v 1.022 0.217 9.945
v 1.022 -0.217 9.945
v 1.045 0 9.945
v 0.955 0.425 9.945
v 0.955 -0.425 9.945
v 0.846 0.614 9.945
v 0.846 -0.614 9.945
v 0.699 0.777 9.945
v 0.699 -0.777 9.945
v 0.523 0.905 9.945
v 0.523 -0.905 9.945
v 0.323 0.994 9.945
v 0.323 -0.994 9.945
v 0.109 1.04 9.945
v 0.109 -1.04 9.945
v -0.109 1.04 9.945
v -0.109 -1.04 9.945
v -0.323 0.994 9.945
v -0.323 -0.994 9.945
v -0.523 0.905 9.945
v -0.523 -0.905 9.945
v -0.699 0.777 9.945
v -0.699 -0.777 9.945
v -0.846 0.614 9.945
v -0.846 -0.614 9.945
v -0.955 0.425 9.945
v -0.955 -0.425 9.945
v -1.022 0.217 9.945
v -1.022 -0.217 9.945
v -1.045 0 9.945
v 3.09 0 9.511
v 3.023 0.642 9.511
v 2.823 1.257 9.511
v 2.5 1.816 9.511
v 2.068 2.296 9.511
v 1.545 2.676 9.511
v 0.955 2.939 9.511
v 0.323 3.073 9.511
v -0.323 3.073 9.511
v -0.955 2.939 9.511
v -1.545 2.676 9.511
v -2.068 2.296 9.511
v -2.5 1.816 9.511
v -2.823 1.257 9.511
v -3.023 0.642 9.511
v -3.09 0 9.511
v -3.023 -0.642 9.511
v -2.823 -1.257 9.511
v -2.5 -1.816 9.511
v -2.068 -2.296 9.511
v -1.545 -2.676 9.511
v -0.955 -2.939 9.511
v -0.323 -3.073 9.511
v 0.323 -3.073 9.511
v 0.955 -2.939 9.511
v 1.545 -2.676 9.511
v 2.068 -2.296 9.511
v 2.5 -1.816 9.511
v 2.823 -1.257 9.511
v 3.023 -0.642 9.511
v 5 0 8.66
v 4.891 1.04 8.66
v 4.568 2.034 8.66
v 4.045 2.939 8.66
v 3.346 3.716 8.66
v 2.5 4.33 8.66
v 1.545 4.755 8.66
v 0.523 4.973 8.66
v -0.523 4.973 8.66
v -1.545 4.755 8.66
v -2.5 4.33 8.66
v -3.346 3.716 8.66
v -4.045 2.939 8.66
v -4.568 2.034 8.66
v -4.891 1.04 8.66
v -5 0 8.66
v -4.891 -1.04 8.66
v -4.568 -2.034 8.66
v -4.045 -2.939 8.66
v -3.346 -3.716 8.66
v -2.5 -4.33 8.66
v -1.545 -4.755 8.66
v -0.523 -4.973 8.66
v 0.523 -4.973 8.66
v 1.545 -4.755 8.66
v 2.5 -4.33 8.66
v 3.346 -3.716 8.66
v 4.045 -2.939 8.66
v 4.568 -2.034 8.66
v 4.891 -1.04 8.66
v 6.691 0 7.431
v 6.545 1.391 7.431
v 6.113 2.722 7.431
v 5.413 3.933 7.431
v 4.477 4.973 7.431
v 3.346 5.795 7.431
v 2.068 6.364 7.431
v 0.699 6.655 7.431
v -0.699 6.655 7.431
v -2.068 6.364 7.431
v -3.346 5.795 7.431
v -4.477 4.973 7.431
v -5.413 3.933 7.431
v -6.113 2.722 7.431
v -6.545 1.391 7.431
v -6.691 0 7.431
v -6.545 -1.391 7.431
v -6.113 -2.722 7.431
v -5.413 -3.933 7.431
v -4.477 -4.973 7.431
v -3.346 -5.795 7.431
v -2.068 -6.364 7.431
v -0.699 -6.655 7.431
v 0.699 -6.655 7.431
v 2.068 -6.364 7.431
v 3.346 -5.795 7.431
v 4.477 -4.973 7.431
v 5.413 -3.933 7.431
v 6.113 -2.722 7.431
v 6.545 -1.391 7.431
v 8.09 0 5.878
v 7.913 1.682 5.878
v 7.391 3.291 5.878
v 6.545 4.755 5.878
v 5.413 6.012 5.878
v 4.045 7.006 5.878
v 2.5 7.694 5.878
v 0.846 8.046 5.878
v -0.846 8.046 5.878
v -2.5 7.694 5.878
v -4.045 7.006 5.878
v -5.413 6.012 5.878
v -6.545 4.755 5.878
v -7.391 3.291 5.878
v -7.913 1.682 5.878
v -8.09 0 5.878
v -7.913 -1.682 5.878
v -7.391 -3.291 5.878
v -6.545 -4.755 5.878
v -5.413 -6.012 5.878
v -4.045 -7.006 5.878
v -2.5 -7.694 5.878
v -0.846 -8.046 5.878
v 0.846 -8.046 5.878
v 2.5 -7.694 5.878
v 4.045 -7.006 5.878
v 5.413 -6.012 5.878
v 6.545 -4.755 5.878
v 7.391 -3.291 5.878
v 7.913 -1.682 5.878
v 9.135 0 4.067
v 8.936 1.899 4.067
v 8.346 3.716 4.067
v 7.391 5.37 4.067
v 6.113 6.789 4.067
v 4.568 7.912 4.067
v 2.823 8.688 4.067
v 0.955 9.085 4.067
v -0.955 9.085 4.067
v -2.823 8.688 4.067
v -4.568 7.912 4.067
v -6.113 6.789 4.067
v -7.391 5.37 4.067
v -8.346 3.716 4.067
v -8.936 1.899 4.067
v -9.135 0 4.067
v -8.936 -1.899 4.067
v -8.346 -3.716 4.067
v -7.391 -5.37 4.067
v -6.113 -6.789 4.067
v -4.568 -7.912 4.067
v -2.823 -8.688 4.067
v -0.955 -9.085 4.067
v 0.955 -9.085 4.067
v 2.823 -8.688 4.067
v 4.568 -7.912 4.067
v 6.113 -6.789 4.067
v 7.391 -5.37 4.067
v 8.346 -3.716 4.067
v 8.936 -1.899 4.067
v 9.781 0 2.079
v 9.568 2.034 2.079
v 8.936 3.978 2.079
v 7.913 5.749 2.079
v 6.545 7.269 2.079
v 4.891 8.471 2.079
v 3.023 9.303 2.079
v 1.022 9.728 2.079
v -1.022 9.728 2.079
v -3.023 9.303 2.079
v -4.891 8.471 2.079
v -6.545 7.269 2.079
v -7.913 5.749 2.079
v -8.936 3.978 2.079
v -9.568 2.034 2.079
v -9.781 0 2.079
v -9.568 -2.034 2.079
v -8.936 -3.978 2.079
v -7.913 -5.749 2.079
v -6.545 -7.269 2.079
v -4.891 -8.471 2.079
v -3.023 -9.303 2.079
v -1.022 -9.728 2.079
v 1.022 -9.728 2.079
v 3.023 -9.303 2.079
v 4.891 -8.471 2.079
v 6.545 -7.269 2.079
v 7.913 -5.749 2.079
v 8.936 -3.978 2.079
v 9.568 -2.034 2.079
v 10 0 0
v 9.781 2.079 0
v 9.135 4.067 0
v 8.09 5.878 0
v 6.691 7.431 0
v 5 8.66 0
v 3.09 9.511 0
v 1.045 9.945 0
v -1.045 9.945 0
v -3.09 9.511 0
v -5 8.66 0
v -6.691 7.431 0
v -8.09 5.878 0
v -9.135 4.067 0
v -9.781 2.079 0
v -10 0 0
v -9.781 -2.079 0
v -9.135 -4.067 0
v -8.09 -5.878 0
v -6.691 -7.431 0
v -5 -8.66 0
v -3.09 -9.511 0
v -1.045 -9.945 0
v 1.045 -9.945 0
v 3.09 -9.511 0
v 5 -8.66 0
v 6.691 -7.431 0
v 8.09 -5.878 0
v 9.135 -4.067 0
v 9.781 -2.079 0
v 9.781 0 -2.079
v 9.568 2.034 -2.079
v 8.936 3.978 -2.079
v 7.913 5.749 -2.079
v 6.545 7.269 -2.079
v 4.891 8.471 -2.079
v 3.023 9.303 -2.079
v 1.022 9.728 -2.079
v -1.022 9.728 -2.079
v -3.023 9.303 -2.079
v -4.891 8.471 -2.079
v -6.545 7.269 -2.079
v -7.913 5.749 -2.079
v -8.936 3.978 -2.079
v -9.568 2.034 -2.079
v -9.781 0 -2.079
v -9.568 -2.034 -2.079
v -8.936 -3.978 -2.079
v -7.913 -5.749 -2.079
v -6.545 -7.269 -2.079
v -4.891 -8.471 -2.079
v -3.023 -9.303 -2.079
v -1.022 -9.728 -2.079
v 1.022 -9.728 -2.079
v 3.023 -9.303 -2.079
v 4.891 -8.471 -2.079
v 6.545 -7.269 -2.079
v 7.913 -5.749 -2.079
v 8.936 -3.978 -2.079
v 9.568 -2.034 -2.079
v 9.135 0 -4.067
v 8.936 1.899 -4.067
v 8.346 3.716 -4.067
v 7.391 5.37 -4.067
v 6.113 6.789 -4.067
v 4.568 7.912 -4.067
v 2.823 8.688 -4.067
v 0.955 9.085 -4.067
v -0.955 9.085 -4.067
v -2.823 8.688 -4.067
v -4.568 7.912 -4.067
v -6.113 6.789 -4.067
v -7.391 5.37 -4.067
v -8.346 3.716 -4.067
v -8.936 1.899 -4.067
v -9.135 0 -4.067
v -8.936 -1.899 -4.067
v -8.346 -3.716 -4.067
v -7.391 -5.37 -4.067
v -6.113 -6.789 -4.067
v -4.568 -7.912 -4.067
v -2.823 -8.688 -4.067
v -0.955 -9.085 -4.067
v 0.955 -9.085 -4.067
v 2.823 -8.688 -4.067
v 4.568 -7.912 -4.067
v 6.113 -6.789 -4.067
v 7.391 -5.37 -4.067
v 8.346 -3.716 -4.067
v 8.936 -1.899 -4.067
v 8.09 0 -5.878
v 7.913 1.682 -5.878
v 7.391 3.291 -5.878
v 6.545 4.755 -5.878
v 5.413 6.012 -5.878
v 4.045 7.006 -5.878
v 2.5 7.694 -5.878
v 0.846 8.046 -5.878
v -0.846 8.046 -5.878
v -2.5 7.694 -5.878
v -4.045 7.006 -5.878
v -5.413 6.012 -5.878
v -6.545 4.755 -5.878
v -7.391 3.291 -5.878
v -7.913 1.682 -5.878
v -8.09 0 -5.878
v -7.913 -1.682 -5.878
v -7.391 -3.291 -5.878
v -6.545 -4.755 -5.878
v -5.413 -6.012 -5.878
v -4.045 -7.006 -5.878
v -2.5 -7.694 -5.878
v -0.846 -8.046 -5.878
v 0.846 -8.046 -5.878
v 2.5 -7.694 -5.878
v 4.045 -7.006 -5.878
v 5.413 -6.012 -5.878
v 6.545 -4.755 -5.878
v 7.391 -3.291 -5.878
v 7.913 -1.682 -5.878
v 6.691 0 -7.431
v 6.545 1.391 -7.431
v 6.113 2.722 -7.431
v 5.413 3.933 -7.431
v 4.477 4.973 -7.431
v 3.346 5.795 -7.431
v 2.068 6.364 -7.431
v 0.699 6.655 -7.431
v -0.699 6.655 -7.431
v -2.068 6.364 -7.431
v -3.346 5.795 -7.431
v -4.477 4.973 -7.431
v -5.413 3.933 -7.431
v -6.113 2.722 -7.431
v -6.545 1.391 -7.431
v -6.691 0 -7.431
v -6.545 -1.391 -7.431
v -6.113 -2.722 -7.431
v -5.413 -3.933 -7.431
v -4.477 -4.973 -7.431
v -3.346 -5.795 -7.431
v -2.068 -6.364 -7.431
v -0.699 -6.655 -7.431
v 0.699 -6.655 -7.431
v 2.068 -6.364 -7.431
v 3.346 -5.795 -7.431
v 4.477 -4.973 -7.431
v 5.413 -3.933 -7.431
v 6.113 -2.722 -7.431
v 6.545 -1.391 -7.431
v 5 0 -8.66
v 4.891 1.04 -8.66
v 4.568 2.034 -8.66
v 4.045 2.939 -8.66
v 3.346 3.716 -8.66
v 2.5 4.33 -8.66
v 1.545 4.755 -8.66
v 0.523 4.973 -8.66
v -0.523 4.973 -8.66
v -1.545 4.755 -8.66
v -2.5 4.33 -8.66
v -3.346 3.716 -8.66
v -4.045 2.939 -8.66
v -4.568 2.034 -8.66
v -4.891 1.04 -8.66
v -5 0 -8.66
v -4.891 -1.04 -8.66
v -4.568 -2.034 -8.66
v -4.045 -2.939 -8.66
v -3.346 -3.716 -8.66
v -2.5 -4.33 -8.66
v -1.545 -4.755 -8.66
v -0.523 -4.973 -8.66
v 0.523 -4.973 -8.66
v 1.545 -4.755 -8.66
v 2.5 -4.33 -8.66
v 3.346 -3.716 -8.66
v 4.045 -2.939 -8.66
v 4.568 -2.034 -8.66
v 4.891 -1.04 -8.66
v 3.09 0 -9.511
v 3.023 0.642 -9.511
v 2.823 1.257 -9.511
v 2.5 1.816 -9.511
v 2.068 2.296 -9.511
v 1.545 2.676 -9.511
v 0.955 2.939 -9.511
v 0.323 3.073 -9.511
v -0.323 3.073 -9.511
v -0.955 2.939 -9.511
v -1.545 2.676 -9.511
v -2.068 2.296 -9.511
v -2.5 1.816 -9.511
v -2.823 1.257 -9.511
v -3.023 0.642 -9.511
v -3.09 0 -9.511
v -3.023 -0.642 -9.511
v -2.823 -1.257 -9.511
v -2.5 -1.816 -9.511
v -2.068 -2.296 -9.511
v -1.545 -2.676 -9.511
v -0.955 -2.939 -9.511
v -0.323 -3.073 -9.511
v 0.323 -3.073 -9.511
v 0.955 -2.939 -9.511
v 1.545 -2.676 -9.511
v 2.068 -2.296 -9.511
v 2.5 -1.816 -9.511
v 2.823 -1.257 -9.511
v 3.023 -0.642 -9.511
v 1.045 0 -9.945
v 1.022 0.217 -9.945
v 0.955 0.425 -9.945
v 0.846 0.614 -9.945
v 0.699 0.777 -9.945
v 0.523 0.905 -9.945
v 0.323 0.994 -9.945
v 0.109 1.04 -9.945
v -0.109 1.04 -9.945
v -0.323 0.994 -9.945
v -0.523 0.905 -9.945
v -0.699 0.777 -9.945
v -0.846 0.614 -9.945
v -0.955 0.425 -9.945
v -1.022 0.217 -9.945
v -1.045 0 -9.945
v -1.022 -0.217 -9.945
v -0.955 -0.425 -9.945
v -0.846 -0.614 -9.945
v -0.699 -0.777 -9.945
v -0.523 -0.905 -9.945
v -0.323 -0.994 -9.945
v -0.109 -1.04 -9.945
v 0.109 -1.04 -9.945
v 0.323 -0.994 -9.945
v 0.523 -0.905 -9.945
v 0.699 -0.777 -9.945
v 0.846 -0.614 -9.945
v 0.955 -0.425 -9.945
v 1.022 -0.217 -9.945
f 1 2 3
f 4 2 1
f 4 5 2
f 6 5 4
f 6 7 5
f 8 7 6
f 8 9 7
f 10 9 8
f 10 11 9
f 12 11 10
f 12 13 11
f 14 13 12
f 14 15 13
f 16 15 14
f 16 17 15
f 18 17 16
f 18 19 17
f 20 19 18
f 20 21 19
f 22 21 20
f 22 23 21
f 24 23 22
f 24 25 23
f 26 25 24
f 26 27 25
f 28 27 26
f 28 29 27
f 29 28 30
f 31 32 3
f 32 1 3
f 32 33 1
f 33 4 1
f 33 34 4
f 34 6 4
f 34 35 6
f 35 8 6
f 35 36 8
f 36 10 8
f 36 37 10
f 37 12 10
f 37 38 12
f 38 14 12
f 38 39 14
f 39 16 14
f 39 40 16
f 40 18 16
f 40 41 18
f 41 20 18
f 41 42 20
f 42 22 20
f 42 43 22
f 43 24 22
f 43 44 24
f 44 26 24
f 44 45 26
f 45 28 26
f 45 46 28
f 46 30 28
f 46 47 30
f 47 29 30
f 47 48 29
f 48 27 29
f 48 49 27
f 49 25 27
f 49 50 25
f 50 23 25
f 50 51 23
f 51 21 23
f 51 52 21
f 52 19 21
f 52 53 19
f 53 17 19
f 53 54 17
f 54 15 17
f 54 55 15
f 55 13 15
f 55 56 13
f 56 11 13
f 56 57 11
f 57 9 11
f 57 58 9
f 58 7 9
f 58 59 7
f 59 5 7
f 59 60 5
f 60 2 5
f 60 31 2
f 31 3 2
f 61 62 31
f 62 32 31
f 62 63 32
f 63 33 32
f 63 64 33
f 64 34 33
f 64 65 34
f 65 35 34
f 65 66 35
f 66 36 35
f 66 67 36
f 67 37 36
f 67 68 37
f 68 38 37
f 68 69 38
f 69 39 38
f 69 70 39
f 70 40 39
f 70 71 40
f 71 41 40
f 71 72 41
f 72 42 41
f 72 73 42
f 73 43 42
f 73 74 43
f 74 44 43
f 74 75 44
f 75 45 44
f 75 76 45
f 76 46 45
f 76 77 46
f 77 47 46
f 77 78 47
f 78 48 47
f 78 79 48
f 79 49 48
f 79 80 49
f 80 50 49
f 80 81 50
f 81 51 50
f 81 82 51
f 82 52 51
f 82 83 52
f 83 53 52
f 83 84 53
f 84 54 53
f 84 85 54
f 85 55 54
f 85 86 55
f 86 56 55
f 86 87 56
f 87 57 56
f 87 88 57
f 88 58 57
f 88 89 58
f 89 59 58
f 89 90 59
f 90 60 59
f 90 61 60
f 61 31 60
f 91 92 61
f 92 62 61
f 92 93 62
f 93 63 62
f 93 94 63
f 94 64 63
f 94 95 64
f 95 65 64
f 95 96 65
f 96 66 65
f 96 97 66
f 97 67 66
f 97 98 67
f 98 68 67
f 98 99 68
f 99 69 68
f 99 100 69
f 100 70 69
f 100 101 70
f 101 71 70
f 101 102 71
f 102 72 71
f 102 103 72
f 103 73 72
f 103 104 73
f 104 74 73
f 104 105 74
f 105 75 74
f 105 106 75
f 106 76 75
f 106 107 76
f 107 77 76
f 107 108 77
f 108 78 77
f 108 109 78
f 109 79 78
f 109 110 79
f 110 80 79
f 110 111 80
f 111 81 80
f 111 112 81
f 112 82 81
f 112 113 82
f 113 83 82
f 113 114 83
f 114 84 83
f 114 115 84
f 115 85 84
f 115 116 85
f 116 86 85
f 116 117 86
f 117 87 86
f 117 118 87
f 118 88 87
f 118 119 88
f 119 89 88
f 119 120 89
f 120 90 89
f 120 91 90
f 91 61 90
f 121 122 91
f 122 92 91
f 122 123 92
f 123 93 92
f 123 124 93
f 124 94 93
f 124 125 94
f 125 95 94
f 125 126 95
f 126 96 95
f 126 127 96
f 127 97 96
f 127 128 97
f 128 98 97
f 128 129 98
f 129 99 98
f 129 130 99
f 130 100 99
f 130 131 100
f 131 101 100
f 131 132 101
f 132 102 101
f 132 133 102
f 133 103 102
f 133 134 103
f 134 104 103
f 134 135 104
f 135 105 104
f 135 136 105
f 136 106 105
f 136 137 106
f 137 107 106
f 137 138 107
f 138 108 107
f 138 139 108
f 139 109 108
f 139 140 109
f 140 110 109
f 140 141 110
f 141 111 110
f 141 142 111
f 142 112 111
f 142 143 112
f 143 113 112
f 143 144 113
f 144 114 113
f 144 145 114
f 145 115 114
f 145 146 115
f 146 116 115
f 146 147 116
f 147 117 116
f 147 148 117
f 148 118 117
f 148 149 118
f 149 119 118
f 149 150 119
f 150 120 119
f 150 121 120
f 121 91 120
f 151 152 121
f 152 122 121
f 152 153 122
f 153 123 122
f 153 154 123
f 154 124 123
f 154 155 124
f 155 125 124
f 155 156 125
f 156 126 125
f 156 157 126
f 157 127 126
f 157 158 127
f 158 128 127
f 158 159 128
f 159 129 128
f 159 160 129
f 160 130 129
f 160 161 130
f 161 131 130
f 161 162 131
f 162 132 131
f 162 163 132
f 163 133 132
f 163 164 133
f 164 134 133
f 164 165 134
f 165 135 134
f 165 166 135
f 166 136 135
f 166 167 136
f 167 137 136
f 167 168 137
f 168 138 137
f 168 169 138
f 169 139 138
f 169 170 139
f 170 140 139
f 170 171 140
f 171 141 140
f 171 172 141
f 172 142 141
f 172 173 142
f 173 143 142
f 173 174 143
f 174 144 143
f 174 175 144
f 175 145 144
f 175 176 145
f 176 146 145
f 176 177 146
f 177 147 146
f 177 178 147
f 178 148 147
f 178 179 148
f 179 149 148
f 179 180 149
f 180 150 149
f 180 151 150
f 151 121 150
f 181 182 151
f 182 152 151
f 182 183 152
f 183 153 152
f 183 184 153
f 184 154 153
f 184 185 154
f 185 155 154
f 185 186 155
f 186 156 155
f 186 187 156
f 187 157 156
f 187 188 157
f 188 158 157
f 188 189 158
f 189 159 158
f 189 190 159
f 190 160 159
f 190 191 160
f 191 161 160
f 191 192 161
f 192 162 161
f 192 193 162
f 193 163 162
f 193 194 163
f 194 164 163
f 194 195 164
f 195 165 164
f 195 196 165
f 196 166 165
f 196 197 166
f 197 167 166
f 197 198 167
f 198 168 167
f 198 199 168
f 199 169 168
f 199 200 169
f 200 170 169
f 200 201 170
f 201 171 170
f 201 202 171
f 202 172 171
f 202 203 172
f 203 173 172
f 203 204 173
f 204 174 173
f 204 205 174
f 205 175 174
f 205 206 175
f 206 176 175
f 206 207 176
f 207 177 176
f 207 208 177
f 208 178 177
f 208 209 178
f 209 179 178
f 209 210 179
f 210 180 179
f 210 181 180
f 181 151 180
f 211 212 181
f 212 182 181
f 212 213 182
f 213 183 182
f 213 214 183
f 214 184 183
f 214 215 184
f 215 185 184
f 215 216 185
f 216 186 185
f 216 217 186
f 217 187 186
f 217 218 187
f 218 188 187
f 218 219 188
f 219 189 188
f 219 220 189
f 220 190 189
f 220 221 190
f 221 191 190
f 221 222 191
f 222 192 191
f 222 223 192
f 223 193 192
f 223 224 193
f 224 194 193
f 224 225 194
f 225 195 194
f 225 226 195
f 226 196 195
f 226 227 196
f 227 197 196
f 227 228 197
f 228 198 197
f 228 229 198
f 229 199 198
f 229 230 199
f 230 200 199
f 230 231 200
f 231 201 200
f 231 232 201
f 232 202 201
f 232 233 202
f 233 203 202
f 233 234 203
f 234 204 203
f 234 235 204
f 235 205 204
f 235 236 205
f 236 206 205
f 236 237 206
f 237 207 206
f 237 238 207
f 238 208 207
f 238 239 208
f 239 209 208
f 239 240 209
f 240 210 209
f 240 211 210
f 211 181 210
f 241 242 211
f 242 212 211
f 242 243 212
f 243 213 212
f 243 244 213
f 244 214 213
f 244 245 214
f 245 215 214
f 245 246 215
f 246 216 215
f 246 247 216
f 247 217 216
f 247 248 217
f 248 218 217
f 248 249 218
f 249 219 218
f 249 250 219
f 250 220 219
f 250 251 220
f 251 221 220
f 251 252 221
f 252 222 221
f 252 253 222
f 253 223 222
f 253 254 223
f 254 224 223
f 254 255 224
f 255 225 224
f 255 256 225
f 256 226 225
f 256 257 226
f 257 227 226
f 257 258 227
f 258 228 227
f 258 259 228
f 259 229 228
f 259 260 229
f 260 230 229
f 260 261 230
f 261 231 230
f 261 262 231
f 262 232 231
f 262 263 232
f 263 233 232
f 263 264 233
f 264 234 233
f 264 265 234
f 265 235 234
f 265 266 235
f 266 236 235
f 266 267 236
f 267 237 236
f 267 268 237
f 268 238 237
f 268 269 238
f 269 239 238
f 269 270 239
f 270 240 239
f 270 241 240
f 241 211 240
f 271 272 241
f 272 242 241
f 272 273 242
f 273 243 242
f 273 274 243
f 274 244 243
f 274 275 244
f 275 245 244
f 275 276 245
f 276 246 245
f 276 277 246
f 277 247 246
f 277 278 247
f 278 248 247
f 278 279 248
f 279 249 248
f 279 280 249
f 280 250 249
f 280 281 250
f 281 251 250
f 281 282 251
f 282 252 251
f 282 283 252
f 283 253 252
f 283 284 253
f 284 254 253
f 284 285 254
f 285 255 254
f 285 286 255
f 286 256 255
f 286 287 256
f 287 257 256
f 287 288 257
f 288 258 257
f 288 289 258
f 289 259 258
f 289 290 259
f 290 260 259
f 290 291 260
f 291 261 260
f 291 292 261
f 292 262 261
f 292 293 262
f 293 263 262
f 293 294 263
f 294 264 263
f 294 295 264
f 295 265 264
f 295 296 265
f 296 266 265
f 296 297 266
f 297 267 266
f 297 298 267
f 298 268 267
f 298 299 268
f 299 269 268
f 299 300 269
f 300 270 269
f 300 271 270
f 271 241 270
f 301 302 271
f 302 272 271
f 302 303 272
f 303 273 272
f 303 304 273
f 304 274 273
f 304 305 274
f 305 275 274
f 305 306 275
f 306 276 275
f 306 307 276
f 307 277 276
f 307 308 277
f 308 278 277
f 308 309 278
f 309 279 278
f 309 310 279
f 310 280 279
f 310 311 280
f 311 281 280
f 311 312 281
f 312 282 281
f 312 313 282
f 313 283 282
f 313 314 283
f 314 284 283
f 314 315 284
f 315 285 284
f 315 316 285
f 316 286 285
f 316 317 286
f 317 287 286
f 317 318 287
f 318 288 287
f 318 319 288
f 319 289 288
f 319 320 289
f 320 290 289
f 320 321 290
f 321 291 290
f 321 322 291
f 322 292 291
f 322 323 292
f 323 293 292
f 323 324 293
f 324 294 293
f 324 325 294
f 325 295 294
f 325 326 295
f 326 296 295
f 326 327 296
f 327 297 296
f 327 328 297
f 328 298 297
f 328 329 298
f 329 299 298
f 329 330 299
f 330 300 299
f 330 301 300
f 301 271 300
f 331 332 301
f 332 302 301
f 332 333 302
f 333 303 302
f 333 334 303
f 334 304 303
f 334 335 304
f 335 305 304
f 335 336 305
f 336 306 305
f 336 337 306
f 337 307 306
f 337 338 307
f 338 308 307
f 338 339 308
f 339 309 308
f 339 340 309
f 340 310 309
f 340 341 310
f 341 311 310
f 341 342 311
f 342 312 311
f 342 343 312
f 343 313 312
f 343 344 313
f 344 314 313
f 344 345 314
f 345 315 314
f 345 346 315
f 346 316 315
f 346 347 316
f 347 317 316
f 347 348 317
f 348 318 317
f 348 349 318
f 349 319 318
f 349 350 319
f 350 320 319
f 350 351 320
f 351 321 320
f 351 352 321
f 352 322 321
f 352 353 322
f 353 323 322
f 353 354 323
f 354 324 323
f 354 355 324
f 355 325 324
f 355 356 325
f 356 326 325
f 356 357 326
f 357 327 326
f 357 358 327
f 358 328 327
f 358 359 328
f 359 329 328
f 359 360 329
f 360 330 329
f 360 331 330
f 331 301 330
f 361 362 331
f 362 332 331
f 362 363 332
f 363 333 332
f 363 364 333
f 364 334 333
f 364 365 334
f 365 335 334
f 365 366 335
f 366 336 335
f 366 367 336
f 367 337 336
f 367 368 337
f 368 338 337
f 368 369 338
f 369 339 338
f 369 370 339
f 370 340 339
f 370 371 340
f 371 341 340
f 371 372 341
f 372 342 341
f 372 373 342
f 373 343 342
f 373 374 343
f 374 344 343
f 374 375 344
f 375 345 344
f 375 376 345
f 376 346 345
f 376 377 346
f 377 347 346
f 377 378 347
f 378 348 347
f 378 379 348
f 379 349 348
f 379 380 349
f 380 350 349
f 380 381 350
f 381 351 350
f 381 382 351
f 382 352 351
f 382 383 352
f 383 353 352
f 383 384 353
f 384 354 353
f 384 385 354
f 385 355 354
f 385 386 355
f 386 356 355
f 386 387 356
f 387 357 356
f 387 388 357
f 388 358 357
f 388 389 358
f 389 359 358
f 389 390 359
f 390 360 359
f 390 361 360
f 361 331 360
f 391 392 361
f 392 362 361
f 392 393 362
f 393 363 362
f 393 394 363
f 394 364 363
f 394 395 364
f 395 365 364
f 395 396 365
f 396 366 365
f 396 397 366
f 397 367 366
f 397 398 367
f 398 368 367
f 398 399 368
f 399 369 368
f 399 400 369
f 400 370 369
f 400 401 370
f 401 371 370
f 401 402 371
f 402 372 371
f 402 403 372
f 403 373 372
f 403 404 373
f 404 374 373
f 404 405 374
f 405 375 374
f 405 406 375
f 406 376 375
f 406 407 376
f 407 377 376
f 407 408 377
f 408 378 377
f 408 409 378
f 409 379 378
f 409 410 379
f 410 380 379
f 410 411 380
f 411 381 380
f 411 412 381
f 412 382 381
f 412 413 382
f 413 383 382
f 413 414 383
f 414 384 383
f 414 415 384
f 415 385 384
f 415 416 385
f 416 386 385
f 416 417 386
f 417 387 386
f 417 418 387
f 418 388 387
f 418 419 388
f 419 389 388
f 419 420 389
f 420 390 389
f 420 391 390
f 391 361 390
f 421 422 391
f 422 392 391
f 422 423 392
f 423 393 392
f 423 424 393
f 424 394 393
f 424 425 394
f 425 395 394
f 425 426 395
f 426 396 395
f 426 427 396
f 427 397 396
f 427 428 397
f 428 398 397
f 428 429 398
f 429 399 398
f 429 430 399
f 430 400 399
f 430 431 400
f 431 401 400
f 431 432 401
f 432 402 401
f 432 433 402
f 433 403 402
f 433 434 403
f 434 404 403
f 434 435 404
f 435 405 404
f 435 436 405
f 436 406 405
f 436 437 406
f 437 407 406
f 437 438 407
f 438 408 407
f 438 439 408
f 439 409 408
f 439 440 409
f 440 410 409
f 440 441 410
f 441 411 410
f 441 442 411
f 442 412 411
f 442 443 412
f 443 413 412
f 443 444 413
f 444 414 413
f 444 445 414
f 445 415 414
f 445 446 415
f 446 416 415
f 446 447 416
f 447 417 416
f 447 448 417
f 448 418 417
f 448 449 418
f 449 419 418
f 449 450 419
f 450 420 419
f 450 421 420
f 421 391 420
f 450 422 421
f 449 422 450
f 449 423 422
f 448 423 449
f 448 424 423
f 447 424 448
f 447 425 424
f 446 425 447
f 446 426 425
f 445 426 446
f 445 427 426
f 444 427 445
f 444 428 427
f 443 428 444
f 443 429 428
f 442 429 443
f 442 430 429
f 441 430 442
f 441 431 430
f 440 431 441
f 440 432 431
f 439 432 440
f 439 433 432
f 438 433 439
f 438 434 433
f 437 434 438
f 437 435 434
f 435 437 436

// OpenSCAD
module model()
  color("red") 
  union() {
    sphere(10);
  }

model();
%bbox() model();

module bbox() { 

    // a 3D approx. of the children projection on X axis 
    module xProjection() 
        translate([0,1/2,-1/2]) 
            linear_extrude(1) 
                hull() 
                    projection() 
                        rotate([90,0,0]) 
                            linear_extrude(1) 
                                projection() children(); 
  
    // a bounding box with an offset of 1 in all axis
    module bbx()  
        minkowski() { 
            xProjection() children(); // x axis
            rotate(-90)               // y axis
                xProjection() rotate(90) children(); 
            rotate([0,-90,0])         // z axis
                xProjection() rotate([0,90,0]) children(); 
        } 
    
    // offset children() (a cube) by -1 in all axis
    module shrink()
   
      intersection() {
        translate([ 1, 1, 1]) children();
        translate([-1,-1,-1]) children();
      }

   shrink() bbx() children(); 
}
